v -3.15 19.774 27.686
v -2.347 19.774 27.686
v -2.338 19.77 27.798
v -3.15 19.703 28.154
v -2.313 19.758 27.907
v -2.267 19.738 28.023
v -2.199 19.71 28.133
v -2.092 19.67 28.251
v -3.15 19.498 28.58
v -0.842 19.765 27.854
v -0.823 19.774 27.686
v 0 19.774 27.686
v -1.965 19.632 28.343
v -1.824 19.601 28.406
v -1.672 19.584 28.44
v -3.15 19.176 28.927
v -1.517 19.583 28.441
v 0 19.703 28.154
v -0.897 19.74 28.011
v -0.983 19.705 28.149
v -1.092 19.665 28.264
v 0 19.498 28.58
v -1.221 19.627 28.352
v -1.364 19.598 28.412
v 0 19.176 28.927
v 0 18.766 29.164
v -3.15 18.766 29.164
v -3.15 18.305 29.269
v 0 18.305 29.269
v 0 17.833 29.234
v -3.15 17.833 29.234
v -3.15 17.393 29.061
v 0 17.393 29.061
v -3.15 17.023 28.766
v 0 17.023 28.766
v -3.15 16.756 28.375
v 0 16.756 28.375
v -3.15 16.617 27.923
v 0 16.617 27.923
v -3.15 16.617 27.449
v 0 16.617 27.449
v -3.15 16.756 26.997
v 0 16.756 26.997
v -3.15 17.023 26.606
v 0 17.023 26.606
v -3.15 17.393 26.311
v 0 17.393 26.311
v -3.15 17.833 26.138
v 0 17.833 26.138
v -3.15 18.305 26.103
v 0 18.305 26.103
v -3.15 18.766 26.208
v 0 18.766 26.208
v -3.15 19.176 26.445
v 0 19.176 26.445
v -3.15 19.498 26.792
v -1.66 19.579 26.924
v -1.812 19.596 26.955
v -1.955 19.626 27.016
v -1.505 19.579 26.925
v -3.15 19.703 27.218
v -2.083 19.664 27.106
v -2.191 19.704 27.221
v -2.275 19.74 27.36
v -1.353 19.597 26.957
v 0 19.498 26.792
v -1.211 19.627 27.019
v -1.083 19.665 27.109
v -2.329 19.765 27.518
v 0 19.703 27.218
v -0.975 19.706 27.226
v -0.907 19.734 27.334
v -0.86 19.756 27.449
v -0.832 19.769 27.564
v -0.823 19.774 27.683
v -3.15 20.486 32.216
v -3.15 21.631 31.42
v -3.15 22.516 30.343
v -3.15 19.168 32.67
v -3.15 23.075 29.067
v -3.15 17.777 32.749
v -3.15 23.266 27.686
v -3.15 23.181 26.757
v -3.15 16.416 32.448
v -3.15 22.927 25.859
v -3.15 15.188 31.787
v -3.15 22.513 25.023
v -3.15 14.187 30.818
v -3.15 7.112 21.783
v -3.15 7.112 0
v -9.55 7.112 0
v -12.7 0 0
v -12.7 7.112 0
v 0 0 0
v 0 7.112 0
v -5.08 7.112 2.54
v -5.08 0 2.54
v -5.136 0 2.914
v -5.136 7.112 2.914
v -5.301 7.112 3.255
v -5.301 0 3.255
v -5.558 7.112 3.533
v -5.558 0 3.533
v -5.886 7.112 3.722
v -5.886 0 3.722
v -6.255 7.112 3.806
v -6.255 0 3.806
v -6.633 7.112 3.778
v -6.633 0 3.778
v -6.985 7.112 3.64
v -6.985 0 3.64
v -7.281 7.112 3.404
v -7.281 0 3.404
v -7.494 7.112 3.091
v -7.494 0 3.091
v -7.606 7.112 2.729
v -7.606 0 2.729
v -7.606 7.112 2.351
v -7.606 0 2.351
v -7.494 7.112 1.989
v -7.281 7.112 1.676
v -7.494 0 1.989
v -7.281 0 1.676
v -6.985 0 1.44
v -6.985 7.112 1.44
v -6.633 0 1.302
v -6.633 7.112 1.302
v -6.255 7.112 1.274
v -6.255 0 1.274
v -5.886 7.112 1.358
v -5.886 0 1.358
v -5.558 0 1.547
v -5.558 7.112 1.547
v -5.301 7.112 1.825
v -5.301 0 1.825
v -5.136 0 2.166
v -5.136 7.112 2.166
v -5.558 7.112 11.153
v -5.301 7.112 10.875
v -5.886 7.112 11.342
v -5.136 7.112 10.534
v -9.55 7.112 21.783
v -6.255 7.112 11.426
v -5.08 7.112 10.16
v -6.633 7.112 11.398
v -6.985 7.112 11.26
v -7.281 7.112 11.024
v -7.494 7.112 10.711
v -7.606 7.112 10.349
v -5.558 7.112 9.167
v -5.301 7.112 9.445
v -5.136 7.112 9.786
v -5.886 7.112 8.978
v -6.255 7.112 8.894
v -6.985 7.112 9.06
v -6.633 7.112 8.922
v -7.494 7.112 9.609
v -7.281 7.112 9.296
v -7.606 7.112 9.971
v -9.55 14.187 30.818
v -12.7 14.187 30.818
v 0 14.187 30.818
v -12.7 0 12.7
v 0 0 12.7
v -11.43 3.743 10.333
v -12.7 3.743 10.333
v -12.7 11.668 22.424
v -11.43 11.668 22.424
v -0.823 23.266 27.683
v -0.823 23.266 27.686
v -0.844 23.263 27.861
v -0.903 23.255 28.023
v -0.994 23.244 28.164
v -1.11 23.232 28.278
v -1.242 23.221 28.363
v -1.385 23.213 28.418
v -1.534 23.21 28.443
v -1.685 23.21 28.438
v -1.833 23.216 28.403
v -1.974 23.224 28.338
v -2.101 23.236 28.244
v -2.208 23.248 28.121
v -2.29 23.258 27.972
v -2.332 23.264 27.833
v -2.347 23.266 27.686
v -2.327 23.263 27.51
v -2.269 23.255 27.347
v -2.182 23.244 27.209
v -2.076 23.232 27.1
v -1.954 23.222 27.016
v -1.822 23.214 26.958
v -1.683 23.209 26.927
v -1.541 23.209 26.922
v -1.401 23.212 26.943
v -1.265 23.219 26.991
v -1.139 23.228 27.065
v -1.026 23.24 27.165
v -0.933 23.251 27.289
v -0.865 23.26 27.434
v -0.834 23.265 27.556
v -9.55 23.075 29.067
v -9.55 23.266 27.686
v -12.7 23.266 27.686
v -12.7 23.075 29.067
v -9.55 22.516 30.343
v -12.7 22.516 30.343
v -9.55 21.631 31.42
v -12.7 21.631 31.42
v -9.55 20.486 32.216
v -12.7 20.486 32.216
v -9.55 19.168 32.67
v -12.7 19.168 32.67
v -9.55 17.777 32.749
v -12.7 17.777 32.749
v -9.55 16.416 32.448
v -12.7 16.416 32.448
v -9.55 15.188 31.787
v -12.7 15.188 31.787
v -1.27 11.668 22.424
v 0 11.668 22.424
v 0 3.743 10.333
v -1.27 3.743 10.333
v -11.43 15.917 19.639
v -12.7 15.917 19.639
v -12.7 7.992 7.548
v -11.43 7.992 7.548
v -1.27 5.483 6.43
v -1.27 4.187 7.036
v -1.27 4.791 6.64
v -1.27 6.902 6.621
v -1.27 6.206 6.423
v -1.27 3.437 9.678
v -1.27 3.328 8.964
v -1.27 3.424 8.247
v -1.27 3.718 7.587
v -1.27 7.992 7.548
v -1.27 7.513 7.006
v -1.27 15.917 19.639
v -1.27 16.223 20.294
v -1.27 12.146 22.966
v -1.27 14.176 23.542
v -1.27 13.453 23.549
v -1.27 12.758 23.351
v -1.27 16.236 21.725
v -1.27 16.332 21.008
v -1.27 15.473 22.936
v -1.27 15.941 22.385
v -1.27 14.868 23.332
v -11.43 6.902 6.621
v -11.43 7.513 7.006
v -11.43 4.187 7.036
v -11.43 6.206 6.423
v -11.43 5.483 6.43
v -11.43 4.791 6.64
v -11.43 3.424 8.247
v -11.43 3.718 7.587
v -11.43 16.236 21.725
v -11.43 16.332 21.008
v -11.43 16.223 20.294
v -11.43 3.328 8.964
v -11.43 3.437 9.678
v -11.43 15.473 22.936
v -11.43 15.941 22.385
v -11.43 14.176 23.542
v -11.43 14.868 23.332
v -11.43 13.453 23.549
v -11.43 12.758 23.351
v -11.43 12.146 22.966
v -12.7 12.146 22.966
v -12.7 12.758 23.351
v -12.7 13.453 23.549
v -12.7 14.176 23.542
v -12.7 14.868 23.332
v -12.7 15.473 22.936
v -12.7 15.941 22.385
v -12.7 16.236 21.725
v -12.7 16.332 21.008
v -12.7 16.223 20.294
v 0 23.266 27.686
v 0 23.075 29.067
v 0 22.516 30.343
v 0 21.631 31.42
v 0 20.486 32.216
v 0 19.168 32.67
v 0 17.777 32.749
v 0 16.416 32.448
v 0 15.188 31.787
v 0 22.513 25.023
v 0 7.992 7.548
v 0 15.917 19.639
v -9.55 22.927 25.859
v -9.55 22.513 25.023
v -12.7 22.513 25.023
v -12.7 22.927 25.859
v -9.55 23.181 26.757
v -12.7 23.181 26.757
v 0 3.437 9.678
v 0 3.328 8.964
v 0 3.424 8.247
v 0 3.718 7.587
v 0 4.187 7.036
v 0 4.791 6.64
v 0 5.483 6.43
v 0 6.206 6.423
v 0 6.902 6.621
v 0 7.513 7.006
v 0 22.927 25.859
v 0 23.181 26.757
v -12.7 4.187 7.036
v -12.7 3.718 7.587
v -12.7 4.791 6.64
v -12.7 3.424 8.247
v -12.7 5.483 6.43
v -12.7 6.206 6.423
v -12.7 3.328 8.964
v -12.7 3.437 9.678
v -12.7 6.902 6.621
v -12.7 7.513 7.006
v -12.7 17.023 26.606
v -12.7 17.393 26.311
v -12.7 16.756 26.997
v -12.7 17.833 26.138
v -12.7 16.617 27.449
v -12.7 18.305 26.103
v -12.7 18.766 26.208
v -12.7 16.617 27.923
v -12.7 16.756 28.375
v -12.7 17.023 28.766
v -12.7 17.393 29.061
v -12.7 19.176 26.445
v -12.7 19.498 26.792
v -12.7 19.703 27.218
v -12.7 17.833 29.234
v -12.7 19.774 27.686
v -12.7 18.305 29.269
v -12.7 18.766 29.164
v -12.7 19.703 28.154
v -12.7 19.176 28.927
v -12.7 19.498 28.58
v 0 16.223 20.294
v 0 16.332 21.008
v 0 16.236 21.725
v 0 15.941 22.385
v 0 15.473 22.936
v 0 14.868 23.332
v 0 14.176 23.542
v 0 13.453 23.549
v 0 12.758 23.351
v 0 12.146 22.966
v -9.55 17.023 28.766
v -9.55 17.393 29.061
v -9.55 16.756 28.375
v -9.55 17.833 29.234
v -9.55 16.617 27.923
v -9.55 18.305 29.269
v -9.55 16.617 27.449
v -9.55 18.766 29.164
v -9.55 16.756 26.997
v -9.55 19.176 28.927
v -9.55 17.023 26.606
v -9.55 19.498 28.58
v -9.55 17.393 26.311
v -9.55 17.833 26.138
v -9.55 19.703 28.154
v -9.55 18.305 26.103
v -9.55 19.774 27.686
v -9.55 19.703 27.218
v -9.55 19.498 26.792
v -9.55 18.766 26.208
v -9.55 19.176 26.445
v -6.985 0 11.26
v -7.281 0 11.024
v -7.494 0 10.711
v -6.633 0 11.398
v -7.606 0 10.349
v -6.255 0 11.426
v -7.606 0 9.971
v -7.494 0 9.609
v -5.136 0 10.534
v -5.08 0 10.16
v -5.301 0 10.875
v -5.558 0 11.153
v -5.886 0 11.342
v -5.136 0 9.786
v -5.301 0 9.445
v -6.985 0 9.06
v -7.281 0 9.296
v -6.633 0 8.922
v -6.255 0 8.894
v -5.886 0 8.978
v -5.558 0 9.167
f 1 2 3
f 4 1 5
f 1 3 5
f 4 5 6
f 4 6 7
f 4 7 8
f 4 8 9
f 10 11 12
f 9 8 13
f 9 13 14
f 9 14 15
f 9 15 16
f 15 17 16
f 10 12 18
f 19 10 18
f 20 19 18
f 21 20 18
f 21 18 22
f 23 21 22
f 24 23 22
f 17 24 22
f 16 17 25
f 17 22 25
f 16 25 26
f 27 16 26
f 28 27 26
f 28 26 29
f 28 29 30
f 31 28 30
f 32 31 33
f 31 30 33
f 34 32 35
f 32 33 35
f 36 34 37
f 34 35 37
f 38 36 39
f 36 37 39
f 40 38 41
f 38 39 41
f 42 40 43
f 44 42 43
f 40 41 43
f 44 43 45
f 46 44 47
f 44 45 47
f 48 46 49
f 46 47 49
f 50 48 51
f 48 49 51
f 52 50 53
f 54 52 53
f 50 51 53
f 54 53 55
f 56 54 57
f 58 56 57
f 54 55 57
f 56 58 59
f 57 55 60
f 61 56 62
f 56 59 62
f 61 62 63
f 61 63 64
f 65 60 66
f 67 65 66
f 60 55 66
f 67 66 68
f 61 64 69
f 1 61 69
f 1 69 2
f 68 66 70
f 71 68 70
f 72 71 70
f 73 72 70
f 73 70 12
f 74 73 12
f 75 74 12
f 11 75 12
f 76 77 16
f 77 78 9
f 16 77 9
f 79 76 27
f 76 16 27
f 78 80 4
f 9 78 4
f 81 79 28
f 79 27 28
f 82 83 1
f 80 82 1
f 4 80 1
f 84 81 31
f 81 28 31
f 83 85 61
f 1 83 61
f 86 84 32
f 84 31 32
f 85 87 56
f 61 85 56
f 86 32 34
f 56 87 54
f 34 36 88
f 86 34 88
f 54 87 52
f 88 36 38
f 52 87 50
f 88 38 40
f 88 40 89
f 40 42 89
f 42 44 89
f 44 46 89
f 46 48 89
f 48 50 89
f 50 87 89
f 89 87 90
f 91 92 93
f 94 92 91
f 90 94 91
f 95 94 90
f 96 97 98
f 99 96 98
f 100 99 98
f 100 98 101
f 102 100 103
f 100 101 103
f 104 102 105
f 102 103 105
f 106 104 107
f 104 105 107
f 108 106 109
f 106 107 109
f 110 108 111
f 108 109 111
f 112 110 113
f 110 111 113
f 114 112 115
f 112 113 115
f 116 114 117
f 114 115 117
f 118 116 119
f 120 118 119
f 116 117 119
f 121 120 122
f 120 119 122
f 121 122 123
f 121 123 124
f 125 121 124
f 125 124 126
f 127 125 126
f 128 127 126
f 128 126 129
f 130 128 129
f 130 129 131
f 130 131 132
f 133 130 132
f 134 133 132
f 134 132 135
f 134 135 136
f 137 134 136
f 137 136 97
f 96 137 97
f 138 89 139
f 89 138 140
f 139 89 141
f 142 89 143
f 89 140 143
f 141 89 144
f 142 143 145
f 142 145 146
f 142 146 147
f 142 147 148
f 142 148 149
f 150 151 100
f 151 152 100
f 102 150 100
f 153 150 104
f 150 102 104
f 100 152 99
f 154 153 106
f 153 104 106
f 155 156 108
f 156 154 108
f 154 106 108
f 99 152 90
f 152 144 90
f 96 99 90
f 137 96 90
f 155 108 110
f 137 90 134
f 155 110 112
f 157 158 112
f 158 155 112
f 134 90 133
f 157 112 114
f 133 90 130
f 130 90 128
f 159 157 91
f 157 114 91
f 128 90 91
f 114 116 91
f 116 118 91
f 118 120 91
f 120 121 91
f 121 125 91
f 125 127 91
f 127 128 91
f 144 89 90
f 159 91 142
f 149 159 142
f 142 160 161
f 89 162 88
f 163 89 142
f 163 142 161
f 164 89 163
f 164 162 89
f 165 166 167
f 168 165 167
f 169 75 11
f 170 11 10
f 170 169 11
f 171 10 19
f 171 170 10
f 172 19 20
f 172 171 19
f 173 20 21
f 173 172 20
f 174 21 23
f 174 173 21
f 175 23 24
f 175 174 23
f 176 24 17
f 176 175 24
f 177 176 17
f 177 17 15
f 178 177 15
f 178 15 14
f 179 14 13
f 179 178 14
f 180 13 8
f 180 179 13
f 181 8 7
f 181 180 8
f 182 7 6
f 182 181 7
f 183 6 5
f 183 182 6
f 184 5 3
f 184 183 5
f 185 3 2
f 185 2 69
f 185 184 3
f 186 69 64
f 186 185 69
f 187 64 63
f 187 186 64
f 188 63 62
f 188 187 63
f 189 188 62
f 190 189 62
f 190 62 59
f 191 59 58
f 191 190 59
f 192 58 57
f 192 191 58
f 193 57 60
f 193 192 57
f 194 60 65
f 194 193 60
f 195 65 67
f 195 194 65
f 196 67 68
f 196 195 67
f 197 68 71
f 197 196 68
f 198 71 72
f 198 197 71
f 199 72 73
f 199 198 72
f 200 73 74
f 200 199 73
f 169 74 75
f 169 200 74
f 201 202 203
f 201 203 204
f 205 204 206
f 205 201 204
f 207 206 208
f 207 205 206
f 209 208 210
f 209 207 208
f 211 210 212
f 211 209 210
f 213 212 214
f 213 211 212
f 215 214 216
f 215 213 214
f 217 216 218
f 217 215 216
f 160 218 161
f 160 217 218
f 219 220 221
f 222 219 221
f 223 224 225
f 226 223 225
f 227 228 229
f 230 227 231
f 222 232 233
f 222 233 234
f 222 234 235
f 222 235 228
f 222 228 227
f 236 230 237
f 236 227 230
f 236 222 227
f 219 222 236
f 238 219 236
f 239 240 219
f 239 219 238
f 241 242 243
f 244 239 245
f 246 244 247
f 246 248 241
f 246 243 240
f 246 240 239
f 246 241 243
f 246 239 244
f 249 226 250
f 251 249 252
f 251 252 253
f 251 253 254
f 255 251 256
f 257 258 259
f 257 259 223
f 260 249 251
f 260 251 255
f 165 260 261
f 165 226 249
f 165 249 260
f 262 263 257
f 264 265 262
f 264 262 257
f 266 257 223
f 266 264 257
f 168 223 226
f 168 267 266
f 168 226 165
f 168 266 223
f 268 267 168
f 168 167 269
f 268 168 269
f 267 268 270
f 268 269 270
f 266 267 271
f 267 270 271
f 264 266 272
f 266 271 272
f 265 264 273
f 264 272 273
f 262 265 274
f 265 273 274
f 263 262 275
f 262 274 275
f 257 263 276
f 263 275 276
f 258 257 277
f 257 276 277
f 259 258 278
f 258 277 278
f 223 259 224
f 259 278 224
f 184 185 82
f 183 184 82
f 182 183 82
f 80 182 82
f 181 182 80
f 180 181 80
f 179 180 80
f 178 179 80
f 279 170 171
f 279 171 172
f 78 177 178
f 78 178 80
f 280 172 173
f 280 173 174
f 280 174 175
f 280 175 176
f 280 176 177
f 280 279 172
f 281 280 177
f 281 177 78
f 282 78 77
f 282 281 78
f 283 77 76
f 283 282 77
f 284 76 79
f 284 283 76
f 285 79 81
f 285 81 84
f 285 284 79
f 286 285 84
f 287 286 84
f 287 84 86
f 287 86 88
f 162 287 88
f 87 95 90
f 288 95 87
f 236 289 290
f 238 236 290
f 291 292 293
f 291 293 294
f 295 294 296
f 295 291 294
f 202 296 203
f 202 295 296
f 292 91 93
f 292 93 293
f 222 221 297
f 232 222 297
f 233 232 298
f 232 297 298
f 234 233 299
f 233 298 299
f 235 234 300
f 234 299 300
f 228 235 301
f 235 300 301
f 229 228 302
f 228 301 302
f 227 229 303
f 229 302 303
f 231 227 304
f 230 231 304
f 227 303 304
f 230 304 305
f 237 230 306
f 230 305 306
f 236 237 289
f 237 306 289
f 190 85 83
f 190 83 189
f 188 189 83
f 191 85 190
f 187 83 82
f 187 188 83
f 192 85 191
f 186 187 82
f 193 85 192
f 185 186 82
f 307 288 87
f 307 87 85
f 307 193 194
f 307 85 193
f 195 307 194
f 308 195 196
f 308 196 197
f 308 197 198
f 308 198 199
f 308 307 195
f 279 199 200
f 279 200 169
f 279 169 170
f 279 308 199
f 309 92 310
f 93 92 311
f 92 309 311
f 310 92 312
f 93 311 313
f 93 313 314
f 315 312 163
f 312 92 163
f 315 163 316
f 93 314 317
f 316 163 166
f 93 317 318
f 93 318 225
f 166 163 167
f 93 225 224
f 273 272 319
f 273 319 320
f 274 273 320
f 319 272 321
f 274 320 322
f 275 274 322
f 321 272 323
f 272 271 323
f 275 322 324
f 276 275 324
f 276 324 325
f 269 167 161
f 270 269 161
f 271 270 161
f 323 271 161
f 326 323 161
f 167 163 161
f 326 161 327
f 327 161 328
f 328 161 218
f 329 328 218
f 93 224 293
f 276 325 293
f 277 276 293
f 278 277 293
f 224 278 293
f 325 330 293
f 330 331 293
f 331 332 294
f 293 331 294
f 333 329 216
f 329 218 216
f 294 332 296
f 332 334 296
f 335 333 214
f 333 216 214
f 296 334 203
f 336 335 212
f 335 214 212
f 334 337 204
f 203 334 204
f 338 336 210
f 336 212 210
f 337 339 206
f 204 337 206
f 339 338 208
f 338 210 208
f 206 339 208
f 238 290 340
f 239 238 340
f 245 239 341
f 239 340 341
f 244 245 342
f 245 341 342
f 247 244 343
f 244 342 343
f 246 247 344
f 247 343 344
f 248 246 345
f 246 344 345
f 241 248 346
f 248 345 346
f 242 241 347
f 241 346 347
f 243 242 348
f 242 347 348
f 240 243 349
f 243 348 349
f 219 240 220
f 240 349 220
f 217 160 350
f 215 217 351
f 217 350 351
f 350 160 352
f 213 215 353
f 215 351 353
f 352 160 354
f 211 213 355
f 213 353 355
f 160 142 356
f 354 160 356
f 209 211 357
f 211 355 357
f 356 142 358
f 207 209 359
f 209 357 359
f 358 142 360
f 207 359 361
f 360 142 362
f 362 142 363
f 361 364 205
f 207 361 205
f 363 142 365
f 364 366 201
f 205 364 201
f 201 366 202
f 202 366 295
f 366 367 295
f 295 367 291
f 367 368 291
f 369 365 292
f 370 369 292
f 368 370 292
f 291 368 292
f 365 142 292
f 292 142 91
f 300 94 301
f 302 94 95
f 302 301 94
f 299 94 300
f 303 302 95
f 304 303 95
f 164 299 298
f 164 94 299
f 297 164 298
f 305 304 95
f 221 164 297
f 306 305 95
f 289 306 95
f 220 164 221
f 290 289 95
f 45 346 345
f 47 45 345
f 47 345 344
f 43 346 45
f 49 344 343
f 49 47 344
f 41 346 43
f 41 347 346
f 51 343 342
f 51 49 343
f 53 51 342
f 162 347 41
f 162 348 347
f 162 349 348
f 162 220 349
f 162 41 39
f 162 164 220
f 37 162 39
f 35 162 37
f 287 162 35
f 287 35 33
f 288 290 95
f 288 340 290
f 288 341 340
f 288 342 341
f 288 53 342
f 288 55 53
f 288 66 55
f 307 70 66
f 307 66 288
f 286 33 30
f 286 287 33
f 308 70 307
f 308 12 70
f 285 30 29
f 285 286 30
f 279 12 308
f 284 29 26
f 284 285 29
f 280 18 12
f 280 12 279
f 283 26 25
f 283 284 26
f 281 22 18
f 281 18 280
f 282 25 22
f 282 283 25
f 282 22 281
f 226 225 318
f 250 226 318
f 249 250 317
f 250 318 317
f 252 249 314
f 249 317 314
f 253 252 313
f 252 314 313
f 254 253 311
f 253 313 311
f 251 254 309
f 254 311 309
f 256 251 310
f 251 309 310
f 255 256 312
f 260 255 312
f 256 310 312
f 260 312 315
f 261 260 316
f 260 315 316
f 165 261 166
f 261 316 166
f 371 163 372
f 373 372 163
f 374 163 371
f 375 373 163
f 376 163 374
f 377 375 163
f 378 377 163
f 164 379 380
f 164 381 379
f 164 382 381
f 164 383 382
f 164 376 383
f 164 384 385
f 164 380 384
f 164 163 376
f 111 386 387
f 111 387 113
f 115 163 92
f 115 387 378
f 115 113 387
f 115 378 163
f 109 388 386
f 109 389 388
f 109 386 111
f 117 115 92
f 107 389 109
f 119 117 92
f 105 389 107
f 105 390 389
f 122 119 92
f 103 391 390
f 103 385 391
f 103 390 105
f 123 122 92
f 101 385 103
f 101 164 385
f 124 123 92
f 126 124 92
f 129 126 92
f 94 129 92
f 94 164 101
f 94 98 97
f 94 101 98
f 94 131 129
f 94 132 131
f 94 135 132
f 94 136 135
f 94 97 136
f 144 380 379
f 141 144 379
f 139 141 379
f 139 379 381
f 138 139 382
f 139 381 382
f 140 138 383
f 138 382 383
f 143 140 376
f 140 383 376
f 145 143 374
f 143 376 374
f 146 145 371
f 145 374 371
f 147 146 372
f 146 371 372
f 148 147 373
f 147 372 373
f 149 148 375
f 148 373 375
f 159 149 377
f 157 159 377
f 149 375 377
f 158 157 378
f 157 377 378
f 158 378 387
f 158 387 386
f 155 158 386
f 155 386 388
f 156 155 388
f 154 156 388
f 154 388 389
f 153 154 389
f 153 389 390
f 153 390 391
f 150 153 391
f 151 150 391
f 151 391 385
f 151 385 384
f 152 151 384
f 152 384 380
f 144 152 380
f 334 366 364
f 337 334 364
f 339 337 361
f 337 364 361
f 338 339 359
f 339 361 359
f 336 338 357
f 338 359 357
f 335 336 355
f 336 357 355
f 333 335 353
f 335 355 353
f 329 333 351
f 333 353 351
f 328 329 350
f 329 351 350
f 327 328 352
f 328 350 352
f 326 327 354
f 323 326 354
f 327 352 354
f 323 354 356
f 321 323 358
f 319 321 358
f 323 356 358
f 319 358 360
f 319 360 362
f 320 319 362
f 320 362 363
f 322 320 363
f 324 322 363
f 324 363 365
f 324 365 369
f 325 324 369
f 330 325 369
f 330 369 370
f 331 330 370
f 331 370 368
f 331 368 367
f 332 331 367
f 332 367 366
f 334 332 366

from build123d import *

# Parameters (mm, degrees)
F0_R      = 1.5875
F1_DEPTH  = 12.7
F2_R      = 1.27
F3_DEPTH  = 25.4
F5_DEPTH  = 32.767
F7_R      = 0.762
F8_DEPTH  = 5.08
F10_DEPTH = 1.27
F12_DEPTH = 1.27


with BuildPart() as f1:
    # F0 (on Right) → F1 (new body)
    with BuildSketch(Plane.YZ):
        with BuildLine():
            ThreePointArc((22.5126934436, 25.0233725308), (23.0743428543, 26.3023762602), (23.2664, 27.686))
            ThreePointArc((23.2664, 27.686), (19.8428720781, 32.4883432046), (14.1866754903, 30.817869066))
            Line((14.1866754903, 30.817869066), (0, 12.7))
            Line((0, 12.7), (0, 0))
            Line((0, 0), (7.112, 0))
            Line((7.112, 0), (22.5126934436, 25.0233725308))
        make_face()
        with Locations((18.1864, 27.686)):
            Circle(F0_R, mode=Mode.SUBTRACT)
    extrude(amount=-F1_DEPTH)

    # F2 (on face) → F3 (cut)
    with BuildSketch(Plane.XZ):
        with Locations((-6.35, 10.16)):
            Circle(F2_R)
        with Locations((-6.35, 2.54)):
            Circle(F2_R)
    extrude(amount=-F3_DEPTH, mode=Mode.SUBTRACT)

    # F4 (on face) → F5 (cut, through all)
    with BuildSketch(Plane(origin=(0, 0, 0), x_dir=(1, 0, 0), z_dir=(0, 0, -1))):
        Polygon((-5.5372, -7.112), (-7.1628, -7.112), (-9.5504, -7.112), (-9.5504, -9.4996), (-9.5504, -27.9279650633), (-3.1496, -27.9279650633), (-3.1496, -9.4996), (-3.1496, -7.112), align=None)
    extrude(amount=-F5_DEPTH, mode=Mode.SUBTRACT)

    # F7 (on plane+point) → F8 (cut)
    with BuildSketch(Plane.XZ.offset(-23.2664)):
        with Locations((-1.5849518823, 27.6825465262)):
            Circle(F7_R)
    extrude(amount=F8_DEPTH, mode=Mode.SUBTRACT)

    # F9 (on face) → F10 (cut)
    with BuildSketch(Plane.YZ):
        with BuildLine():
            Line((11.667870953, 22.4236173585), (3.743070953, 10.3332173585))
            ThreePointArc((3.743070953, 10.3332173585), (4.4749826415, 6.816470953), (7.991729047, 7.5483826415))
            Line((7.991729047, 7.5483826415), (15.916529047, 19.6387826415))
            ThreePointArc((15.916529047, 19.6387826415), (15.1846173585, 23.155529047), (11.667870953, 22.4236173585))
        make_face()
    extrude(amount=-F10_DEPTH, mode=Mode.SUBTRACT)

    # F11 (on face) → F12 (cut)
    with BuildSketch(Plane(origin=(-12.7, 0, 0), x_dir=(0, -1, 0), z_dir=(-1, 0, 0))):
        with BuildLine():
            Line((-15.916529047, 19.6387826415), (-7.991729047, 7.5483826415))
            ThreePointArc((-7.991729047, 7.5483826415), (-4.4749826415, 6.816470953), (-3.743070953, 10.3332173585))
            Line((-3.743070953, 10.3332173585), (-11.667870953, 22.4236173585))
            ThreePointArc((-11.667870953, 22.4236173585), (-15.1846173585, 23.155529047), (-15.916529047, 19.6387826415))
        make_face()
    extrude(amount=-F12_DEPTH, mode=Mode.SUBTRACT)


solid = f1.part
